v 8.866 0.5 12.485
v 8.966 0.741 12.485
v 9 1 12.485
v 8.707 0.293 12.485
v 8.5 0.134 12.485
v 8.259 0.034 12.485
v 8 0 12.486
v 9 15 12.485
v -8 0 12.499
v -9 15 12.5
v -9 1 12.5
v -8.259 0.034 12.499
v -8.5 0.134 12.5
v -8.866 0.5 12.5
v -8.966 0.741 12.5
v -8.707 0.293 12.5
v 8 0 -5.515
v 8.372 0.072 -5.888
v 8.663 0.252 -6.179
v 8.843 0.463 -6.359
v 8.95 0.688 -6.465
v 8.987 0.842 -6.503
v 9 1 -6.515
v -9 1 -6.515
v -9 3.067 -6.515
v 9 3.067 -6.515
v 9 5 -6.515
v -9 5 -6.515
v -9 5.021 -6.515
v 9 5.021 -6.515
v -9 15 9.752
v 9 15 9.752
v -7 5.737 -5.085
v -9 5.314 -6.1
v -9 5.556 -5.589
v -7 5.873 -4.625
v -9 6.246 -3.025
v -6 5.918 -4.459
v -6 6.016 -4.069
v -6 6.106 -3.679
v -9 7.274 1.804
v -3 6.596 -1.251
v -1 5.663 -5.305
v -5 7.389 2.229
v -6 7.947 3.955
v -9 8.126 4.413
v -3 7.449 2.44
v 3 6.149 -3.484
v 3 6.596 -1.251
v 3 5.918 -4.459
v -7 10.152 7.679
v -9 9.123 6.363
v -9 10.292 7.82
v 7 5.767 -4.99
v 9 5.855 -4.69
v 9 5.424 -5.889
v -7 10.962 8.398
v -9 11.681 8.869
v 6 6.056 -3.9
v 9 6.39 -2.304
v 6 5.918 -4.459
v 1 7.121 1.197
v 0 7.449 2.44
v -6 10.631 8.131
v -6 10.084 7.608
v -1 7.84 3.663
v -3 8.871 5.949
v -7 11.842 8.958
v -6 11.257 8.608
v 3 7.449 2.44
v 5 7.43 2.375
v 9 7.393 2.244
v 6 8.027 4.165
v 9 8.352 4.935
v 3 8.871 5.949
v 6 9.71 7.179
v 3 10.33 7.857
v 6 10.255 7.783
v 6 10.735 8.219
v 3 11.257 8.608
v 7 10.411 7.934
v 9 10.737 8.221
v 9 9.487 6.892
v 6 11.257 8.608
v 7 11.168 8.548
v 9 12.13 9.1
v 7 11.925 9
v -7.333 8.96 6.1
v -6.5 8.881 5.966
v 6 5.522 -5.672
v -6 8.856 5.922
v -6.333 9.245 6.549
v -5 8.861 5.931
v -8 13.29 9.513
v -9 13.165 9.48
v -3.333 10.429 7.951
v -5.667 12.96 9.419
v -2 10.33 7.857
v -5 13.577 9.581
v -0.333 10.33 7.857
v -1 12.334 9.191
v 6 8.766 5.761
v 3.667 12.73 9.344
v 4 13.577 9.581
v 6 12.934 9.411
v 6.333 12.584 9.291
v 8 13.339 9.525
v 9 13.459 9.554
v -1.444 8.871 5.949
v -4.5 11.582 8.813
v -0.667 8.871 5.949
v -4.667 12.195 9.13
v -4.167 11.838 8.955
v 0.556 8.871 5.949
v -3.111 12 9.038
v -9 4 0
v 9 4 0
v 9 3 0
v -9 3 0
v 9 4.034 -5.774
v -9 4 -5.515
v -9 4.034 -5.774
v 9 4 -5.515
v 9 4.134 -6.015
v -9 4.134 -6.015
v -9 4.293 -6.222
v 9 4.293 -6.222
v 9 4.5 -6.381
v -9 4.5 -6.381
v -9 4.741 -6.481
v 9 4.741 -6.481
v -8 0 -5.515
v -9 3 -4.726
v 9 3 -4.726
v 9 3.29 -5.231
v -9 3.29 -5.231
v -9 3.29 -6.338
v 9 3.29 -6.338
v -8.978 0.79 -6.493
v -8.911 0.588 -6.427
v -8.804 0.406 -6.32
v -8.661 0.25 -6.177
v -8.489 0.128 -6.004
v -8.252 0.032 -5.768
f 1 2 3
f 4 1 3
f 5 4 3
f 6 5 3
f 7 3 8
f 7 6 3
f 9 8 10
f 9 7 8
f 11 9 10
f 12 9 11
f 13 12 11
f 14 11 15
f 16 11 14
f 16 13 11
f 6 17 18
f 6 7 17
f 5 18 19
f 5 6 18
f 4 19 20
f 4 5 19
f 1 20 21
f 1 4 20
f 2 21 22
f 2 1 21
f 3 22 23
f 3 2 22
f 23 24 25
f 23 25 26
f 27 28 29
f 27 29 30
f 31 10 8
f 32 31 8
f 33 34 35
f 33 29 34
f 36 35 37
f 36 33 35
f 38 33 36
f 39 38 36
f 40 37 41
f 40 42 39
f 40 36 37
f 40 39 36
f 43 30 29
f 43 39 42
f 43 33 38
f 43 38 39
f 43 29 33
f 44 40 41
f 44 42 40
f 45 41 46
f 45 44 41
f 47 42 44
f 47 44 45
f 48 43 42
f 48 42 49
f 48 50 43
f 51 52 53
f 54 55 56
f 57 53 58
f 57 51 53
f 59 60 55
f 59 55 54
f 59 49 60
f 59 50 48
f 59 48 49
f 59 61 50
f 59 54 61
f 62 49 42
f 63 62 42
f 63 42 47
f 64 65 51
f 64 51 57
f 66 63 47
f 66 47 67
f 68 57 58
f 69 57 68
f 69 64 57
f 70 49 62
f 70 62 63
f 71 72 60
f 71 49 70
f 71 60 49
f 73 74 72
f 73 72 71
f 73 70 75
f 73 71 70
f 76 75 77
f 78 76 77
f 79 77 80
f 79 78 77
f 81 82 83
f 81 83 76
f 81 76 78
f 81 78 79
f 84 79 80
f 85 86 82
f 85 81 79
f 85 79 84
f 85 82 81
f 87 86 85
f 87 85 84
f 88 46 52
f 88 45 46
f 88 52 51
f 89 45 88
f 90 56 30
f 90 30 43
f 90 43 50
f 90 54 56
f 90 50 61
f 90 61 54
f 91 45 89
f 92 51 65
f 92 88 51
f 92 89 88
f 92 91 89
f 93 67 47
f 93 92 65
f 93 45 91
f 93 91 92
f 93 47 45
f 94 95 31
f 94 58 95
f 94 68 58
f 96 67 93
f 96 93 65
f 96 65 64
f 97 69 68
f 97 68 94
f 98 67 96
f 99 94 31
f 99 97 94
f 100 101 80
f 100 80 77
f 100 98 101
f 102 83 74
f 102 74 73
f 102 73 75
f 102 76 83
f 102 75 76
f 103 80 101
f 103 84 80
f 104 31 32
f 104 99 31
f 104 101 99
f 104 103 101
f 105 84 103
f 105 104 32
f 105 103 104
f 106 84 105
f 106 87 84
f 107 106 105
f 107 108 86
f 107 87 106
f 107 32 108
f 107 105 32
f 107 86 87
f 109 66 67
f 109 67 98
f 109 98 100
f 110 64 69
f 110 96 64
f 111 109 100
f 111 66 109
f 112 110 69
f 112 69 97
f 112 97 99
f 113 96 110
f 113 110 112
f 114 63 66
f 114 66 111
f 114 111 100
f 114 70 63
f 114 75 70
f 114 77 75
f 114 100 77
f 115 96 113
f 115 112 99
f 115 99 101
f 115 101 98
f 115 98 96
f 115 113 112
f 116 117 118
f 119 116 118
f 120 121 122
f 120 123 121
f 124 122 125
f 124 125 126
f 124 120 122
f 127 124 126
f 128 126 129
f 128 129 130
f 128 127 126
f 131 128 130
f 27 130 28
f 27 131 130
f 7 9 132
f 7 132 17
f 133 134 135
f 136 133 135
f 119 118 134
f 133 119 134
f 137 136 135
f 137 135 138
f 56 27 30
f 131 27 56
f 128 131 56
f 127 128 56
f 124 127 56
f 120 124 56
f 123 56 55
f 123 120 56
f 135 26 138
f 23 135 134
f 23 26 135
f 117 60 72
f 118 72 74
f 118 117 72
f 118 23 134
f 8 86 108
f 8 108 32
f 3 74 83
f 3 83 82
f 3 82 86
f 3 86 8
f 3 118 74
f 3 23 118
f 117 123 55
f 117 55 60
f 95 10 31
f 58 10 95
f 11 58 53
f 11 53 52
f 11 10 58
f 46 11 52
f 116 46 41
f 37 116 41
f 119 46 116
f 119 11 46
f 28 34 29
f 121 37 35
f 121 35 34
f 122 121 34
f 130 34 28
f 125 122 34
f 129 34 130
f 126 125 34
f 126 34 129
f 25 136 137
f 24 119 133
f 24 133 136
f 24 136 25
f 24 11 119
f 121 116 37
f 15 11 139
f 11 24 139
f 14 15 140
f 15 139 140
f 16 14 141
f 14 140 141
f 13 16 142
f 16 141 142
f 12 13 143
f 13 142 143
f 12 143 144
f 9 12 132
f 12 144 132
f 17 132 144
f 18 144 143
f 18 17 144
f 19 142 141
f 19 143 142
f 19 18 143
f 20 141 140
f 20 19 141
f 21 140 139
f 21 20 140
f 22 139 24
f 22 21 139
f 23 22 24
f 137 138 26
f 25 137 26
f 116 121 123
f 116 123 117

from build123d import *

# Parameters (mm, degrees)
F1_DEPTH = 15
F4_DEPTH = 19
F5_R     = 1


with BuildPart() as f1:
    # F0 (on Front) → F1 (new body)
    with BuildSketch(Plane.XZ):
        Polygon((-9, 12.5), (-9, 0), (-9, -6.5152065011), (8.9999935767, -6.5152065011), (8.9999935767, 12.4847934989), align=None)
    extrude(amount=-F1_DEPTH)

    # F3 (on offset) → F4 (cut)
    with BuildSketch(Plane.YZ.offset(8.9999935767)):
        Polygon((3, -6.568428129), (3, -6.9065713324), (4, -6.9065713324), (4, 0), (3, 0), (3, -4.7258920968), (3.2896485645, -5.2308174782), (3.2896485645, -6.3381111249), align=None)
        with BuildLine():
            add(Edge.make_bspline(
                [(4, -6.9065713324), (7.8309681267, -7.469817996), (4.7241249122, 9.7180437297), (15.3055908158, 9.7582889721)],
                knots=[0, 0, 0, 0, 20.1378735884, 20.1378735884, 20.1378735884, 20.1378735884], degree=3))
            Line((4, -6.9065713324), (4, -7.8707002103))
            Line((4, -7.8707002103), (15.5558949336, -7.8707002103))
            Line((15.5558949336, -7.8707002103), (15.5558949336, -0.2191853659))
            Line((15.5558949336, -0.2191853659), (15.5479665846, 0.0968497843))
            Line((15.5479665846, 0.0968497843), (15.3055908158, 9.7582889721))
        make_face()
    extrude(amount=-F4_DEPTH, mode=Mode.SUBTRACT)

    # F5
    f5_edges = [f1.edges().sort_by_distance(p)[0] for p in [
        (-9, 0, 2.992397),
        (-3e-06, 0, -6.515207),
        (8.999994, 0, 2.984793),
        (-3e-06, 4, -6.515207),
    ]]
    fillet(f5_edges, radius=F5_R)


solid = f1.part
